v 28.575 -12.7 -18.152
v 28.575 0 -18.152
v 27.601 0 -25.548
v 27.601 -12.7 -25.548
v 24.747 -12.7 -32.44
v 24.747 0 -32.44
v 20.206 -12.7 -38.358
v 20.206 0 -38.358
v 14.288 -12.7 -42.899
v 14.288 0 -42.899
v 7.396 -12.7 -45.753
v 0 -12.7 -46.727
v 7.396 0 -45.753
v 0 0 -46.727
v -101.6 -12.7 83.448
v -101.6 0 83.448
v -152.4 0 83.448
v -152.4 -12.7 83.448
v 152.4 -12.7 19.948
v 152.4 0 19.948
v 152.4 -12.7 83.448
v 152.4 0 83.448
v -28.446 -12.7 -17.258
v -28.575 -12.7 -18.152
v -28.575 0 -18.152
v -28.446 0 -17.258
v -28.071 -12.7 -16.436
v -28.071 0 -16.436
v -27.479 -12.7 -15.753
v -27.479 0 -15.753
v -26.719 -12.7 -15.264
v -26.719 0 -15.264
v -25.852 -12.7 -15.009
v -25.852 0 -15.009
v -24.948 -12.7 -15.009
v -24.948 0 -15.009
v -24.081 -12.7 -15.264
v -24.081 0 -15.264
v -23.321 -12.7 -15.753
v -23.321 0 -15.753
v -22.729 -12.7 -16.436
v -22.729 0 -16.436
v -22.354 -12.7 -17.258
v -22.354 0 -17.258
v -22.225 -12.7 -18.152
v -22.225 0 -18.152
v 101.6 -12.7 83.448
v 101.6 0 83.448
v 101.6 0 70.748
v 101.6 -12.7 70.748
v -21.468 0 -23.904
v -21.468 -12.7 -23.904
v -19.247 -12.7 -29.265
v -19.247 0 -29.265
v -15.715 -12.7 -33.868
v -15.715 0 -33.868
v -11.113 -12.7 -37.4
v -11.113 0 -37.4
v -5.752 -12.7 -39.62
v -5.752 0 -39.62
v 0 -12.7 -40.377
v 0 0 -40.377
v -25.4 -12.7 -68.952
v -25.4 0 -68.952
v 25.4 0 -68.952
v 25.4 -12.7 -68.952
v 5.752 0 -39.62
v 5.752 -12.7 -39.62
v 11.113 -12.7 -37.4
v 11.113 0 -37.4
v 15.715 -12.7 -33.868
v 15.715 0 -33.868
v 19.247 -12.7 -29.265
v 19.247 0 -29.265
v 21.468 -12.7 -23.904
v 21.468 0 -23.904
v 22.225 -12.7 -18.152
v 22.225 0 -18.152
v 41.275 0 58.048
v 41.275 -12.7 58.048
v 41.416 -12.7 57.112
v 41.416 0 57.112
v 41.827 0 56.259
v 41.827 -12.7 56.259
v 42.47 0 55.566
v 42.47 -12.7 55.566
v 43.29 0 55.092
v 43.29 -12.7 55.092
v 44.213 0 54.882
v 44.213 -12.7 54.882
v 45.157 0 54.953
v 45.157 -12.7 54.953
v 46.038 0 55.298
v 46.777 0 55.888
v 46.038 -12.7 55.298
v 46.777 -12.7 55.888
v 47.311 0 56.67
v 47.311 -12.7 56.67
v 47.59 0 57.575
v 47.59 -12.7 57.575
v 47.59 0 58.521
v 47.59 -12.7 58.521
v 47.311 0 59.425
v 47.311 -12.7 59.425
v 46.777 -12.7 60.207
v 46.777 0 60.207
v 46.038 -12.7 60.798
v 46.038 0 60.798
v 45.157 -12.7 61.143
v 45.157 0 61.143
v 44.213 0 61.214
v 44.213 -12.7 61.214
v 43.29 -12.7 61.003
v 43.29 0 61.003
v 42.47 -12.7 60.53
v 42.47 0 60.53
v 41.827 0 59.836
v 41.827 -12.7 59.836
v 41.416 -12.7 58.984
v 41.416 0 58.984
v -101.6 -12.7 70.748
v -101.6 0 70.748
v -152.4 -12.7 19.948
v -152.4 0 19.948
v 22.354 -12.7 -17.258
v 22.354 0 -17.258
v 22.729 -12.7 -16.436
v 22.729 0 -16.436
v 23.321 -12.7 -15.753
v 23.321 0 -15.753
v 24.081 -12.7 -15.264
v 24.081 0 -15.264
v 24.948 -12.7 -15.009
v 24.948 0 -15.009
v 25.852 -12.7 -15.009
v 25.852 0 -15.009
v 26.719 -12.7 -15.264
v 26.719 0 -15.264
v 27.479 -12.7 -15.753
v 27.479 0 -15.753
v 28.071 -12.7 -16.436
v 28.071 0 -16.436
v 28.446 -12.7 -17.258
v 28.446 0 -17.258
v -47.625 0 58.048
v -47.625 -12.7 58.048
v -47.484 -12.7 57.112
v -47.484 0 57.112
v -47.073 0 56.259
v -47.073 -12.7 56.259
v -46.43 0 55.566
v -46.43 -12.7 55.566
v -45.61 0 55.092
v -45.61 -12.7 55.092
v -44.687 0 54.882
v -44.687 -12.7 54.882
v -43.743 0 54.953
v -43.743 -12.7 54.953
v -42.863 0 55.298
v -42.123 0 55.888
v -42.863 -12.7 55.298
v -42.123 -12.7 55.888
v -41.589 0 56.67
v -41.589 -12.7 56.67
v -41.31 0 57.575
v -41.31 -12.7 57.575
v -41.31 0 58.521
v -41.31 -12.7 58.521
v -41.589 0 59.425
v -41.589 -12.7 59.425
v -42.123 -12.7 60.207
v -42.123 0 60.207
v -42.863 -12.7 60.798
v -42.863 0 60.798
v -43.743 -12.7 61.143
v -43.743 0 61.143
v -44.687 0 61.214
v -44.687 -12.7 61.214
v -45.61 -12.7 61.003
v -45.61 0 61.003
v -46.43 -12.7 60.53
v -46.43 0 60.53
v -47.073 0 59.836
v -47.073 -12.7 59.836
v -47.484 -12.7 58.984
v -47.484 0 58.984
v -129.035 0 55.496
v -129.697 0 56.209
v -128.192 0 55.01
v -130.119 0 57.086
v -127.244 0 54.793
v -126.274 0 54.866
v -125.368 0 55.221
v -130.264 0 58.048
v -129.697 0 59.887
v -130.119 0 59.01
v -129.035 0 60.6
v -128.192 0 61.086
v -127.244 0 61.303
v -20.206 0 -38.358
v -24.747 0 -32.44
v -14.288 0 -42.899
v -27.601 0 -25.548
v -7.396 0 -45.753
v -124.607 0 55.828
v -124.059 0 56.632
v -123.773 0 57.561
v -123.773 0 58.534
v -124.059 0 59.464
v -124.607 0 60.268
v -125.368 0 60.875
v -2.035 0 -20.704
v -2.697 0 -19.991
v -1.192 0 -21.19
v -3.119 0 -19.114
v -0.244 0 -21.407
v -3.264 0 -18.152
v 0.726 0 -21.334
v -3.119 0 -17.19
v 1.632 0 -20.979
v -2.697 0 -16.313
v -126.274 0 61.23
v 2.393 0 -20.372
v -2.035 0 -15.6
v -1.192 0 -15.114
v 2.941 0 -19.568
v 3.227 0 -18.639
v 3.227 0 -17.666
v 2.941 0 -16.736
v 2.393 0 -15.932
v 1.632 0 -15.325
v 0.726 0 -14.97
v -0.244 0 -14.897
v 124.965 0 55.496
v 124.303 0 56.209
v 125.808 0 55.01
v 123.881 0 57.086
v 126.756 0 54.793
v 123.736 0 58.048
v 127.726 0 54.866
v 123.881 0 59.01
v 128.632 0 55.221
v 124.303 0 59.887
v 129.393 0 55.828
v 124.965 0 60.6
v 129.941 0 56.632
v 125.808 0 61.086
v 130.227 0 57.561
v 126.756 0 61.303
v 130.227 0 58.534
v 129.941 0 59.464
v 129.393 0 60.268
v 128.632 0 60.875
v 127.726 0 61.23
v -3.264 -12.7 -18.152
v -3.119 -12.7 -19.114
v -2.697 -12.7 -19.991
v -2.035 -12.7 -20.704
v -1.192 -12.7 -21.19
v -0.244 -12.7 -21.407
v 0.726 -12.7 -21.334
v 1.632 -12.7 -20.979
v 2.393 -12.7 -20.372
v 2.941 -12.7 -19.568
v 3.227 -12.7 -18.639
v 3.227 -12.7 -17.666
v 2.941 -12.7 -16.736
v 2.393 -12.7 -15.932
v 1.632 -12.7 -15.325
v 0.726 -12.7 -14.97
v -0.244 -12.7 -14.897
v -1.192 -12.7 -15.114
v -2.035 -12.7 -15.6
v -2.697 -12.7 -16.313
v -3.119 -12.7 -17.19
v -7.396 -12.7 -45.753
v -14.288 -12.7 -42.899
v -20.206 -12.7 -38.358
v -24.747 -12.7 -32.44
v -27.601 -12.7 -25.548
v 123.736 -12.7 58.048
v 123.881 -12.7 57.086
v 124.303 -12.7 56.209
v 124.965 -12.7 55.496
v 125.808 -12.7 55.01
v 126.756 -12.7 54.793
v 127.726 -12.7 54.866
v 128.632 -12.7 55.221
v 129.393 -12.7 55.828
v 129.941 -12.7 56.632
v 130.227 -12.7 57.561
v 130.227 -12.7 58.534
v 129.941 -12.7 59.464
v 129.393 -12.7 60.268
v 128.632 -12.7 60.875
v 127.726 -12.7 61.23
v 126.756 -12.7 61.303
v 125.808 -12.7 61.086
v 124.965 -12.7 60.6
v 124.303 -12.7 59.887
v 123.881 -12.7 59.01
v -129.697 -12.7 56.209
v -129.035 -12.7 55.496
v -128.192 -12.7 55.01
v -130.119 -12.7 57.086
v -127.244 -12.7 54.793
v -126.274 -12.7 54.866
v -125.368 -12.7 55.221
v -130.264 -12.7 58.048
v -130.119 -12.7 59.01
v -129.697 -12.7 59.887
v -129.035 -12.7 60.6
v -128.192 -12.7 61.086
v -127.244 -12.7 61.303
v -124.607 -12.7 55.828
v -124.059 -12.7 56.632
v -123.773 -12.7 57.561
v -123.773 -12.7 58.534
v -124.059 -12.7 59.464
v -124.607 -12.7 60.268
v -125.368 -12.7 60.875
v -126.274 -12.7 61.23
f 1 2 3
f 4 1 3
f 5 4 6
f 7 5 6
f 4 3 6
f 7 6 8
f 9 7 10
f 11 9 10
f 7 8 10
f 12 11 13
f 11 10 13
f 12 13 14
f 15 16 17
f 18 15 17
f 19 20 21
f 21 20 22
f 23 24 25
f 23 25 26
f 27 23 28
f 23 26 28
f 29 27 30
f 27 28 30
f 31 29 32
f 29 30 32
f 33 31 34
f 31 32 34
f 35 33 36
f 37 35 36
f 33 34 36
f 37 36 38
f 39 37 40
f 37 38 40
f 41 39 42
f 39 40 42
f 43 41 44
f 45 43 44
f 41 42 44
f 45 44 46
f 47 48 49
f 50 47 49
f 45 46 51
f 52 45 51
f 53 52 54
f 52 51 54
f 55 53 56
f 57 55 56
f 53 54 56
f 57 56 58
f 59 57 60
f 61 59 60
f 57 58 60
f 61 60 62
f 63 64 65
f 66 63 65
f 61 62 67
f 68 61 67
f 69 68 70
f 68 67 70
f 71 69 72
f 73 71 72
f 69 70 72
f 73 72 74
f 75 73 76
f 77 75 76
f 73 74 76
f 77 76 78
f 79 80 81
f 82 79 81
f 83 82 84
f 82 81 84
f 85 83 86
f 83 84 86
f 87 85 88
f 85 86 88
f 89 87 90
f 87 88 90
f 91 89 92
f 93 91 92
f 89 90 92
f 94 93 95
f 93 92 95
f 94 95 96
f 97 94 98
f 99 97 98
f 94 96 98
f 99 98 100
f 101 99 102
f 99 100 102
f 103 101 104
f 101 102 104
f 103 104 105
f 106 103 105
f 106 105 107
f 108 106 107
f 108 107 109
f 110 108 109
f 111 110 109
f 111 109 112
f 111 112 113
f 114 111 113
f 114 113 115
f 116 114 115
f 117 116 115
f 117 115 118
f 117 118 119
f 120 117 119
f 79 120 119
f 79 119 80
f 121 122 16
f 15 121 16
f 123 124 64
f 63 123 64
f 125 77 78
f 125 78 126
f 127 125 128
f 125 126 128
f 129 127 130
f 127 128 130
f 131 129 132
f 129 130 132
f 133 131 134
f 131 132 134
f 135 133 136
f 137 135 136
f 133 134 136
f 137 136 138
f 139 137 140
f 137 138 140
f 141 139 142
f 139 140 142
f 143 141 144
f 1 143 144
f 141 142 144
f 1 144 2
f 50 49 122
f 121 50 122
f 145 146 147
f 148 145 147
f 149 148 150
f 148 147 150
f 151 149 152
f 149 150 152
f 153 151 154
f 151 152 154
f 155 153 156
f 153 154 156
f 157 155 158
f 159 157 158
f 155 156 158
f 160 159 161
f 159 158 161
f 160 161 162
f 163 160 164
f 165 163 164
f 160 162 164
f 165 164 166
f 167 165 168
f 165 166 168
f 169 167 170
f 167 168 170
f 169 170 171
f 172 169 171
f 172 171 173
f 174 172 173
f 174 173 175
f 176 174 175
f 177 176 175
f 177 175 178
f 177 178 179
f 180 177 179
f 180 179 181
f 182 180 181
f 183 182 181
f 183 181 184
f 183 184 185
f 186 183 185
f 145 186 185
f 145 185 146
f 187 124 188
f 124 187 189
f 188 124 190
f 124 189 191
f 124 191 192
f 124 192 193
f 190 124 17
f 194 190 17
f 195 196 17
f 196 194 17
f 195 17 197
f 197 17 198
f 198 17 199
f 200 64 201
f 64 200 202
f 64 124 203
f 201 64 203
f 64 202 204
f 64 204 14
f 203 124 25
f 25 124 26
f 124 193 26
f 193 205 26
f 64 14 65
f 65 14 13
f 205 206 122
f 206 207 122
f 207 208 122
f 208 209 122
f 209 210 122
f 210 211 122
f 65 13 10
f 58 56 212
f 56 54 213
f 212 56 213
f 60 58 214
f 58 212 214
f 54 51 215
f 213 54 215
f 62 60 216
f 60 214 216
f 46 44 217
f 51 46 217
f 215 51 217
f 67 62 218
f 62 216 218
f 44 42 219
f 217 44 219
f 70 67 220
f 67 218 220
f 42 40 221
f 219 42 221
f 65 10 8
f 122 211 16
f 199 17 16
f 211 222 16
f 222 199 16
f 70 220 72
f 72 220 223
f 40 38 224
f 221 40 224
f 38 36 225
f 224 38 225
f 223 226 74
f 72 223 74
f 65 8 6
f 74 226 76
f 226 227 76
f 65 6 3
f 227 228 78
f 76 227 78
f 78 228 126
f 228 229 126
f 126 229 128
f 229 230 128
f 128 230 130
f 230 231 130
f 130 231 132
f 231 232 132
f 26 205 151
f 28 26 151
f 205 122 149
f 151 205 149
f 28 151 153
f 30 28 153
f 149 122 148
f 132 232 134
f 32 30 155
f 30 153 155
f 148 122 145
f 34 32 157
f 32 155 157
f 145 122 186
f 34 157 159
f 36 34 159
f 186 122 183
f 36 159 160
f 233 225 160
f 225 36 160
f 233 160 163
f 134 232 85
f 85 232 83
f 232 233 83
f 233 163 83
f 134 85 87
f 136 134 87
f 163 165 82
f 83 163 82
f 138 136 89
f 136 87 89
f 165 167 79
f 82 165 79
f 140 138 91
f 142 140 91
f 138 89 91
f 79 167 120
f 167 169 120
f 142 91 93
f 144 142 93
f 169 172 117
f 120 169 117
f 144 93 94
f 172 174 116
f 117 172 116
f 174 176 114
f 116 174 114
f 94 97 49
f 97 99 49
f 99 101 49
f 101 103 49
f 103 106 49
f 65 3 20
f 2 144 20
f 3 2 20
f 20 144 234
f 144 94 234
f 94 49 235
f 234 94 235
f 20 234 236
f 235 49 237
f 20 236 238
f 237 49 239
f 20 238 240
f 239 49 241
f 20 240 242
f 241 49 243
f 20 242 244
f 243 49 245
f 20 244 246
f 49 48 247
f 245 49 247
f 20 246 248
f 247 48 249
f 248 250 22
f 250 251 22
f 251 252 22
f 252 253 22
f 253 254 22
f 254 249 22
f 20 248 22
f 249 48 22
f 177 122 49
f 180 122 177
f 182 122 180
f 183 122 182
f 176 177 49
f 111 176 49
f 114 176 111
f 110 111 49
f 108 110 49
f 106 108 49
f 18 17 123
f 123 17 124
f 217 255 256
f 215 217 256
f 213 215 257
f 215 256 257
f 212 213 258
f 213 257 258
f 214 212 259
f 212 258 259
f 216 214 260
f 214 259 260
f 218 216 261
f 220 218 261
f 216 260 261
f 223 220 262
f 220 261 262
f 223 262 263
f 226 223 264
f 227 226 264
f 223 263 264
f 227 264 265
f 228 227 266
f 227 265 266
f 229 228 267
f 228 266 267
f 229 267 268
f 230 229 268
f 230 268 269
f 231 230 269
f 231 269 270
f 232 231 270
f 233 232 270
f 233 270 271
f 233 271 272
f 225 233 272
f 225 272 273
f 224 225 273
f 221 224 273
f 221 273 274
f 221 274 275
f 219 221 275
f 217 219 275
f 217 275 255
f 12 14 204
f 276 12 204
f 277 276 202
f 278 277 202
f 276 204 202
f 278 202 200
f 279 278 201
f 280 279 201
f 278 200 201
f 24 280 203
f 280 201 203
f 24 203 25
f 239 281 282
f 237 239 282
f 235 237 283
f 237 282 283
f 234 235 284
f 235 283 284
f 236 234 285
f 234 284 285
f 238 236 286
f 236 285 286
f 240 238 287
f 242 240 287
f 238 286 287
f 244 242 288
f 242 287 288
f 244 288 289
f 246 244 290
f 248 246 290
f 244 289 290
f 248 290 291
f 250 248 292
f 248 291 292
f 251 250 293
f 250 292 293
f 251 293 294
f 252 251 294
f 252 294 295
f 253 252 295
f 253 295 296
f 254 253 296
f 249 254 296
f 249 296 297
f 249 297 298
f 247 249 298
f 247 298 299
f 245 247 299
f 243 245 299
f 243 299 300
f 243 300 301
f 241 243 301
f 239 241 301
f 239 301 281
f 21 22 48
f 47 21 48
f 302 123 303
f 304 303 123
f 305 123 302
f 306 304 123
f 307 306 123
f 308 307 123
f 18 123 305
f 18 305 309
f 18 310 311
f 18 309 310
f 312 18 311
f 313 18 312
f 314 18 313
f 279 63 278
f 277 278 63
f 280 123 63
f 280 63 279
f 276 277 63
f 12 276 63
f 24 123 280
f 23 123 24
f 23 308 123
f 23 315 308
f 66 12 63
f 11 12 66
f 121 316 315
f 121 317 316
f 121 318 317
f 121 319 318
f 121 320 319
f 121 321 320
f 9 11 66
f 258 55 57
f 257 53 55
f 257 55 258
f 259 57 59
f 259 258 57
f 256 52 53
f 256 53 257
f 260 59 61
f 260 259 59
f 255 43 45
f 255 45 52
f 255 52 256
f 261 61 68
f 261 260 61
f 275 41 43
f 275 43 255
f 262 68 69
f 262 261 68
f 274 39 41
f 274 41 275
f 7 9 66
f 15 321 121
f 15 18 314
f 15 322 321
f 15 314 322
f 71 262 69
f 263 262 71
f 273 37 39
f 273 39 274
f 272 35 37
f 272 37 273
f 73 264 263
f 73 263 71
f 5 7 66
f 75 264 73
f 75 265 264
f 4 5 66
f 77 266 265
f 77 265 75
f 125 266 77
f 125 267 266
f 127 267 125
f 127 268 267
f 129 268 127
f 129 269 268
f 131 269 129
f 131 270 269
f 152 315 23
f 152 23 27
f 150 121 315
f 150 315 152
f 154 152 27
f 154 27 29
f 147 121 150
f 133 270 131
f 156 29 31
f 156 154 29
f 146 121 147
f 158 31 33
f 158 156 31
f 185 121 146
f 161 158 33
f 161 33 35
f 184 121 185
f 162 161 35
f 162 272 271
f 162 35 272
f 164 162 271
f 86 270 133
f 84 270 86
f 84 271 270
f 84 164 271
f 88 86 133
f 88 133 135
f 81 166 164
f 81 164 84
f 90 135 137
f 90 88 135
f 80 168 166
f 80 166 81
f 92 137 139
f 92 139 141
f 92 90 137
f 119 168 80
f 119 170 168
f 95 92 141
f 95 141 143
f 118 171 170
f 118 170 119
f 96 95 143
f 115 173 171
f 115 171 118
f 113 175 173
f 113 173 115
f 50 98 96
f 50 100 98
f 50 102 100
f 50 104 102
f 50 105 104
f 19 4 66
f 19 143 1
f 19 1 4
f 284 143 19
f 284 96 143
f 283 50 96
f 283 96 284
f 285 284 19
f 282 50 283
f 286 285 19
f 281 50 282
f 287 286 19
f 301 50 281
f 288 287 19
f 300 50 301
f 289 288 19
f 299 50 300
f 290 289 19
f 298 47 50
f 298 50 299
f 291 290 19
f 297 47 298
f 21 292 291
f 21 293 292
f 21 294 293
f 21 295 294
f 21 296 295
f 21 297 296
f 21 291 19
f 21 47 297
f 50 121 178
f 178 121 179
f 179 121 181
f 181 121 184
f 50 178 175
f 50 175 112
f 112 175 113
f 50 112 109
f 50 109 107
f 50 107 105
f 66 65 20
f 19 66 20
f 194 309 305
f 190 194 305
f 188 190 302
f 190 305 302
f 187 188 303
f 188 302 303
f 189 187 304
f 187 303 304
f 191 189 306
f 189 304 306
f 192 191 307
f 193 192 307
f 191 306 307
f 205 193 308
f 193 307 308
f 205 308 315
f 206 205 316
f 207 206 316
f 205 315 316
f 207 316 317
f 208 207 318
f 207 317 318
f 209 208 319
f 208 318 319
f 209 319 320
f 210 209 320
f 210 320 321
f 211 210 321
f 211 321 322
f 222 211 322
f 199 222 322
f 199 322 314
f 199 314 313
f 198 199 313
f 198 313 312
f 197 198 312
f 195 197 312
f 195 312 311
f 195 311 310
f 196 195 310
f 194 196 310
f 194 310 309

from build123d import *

# Parameters (mm, degrees)
F1_DEPTH = 12.7
F2_D     = 6.35
F3_D     = 6.5278
F4_D     = 6.5278
F5_D     = 6.5278


with BuildPart() as f1:
    # F0 (on Front) → F1 (new body)
    with BuildSketch(Plane.XZ):
        with BuildLine():
            Line((0, 51.6978976429), (0, 70.7478976429))
            Line((0, 70.7478976429), (-101.6, 70.7478976429))
            Line((-101.6, 70.7478976429), (-101.6, 83.4478976429))
            Line((-101.6, 83.4478976429), (-152.4, 83.4478976429))
            Line((-152.4, 83.4478976429), (-152.4, 19.9478976429))
            Line((-152.4, 19.9478976429), (-25.4, -68.9521023571))
            Line((-25.4, -68.9521023571), (0, -68.9521023571))
            Line((0, -68.9521023571), (0, -46.7271023571))
            ThreePointArc((0, -46.7271023571), (-20.2055762724, -38.3576786296), (-28.575, -18.1521023571))
            ThreePointArc((-28.575, -18.1521023571), (-25.4, -14.9771023571), (-22.225, -18.1521023571))
            ThreePointArc((-22.225, -18.1521023571), (-15.7154482119, -33.867550569), (0, -40.3771023571))
            Line((0, -40.3771023571), (0, -18.1521023571))
            Line((0, -18.1521023571), (0, 51.6978976429))
        make_face()
        with BuildLine():
            Line((101.6, 70.7478976429), (0, 70.7478976429))
            Line((0, 70.7478976429), (0, 51.6978976429))
            Line((0, 51.6978976429), (0, -18.1521023571))
            Line((0, -18.1521023571), (0, -40.3771023571))
            ThreePointArc((0, -40.3771023571), (15.7154482119, -33.867550569), (22.225, -18.1521023571))
            ThreePointArc((22.225, -18.1521023571), (25.4, -14.9771023571), (28.575, -18.1521023571))
            ThreePointArc((28.575, -18.1521023571), (20.2055762724, -38.3576786296), (0, -46.7271023571))
            Line((0, -46.7271023571), (0, -68.9521023571))
            Line((0, -68.9521023571), (25.4, -68.9521023571))
            Line((25.4, -68.9521023571), (152.4, 19.9478976429))
            Line((152.4, 19.9478976429), (152.4, 83.4478976429))
            Line((152.4, 83.4478976429), (101.6, 83.4478976429))
            Line((101.6, 83.4478976429), (101.6, 70.7478976429))
        make_face()
    extrude(amount=F1_DEPTH)

    # F2 (through all)
    with Locations(Plane(origin=(0, 0, 0), x_dir=(1, 0, 0), z_dir=(0, 1, 0))):
        with Locations((44.45, -58.0478976429), (-44.45, -58.0478976429)):
            Hole(F2_D / 2)

    # F3 (through all)
    with Locations(Plane(origin=(0, 0, 0), x_dir=(1, 0, 0), z_dir=(0, 1, 0))):
        with Locations((-127, -58.0478976429)):
            Hole(F3_D / 2)

    # F4 (through all)
    with Locations(Plane(origin=(0, 0, 0), x_dir=(1, 0, 0), z_dir=(0, 1, 0))):
        with Locations((0, 18.1521023571)):
            Hole(F4_D / 2)

    # F5 (through all)
    with Locations(Plane(origin=(0, 0, 0), x_dir=(1, 0, 0), z_dir=(0, 1, 0))):
        with Locations((127, -58.0478976429)):
            Hole(F5_D / 2)


solid = f1.part
